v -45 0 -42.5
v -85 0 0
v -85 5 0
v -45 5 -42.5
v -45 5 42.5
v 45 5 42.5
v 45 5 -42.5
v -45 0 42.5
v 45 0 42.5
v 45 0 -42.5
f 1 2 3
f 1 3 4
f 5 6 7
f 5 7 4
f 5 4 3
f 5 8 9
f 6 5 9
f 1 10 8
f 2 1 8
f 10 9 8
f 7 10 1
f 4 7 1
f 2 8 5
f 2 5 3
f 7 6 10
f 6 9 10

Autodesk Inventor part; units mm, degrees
ref_plane "YZ Plane" through (0, 0, 0) normal (1, 0, 0) x (0, 1, 0)
ref_plane "XZ Plane" through (0, 0, 0) normal (0, 1, 0) x (-1, 0, 0)
ref_plane "XY Plane" through (0, 0, 0) normal (0, 0, 1) x (1, 0, 0)
sketch "Sketch1" plane through (0, 0, 0) normal (0, 1, 0) x (-1, 0, 0)
  line L0 (45, 42.5) -> (-45, 42.5)
  line L1 (-45, 42.5) -> (-45, -42.5)
  line L2 (-45, -42.5) -> (45, -42.5)
  line L3 (45, 42.5) -> (-45, -42.5) construction
  line L4 (-45, 42.5) -> (45, -42.5) construction
  line L5 (45, 42.5) -> (85, 0)
  line L6 (85, 0) -> (45, -42.5)
  point P0 (0, 0)
  dimension "d0" = 90
  dimension "d1" = 85
extrude "Extrusion1" add sketch "Sketch1" along normal blind 5
properties part number "lidar_base"
